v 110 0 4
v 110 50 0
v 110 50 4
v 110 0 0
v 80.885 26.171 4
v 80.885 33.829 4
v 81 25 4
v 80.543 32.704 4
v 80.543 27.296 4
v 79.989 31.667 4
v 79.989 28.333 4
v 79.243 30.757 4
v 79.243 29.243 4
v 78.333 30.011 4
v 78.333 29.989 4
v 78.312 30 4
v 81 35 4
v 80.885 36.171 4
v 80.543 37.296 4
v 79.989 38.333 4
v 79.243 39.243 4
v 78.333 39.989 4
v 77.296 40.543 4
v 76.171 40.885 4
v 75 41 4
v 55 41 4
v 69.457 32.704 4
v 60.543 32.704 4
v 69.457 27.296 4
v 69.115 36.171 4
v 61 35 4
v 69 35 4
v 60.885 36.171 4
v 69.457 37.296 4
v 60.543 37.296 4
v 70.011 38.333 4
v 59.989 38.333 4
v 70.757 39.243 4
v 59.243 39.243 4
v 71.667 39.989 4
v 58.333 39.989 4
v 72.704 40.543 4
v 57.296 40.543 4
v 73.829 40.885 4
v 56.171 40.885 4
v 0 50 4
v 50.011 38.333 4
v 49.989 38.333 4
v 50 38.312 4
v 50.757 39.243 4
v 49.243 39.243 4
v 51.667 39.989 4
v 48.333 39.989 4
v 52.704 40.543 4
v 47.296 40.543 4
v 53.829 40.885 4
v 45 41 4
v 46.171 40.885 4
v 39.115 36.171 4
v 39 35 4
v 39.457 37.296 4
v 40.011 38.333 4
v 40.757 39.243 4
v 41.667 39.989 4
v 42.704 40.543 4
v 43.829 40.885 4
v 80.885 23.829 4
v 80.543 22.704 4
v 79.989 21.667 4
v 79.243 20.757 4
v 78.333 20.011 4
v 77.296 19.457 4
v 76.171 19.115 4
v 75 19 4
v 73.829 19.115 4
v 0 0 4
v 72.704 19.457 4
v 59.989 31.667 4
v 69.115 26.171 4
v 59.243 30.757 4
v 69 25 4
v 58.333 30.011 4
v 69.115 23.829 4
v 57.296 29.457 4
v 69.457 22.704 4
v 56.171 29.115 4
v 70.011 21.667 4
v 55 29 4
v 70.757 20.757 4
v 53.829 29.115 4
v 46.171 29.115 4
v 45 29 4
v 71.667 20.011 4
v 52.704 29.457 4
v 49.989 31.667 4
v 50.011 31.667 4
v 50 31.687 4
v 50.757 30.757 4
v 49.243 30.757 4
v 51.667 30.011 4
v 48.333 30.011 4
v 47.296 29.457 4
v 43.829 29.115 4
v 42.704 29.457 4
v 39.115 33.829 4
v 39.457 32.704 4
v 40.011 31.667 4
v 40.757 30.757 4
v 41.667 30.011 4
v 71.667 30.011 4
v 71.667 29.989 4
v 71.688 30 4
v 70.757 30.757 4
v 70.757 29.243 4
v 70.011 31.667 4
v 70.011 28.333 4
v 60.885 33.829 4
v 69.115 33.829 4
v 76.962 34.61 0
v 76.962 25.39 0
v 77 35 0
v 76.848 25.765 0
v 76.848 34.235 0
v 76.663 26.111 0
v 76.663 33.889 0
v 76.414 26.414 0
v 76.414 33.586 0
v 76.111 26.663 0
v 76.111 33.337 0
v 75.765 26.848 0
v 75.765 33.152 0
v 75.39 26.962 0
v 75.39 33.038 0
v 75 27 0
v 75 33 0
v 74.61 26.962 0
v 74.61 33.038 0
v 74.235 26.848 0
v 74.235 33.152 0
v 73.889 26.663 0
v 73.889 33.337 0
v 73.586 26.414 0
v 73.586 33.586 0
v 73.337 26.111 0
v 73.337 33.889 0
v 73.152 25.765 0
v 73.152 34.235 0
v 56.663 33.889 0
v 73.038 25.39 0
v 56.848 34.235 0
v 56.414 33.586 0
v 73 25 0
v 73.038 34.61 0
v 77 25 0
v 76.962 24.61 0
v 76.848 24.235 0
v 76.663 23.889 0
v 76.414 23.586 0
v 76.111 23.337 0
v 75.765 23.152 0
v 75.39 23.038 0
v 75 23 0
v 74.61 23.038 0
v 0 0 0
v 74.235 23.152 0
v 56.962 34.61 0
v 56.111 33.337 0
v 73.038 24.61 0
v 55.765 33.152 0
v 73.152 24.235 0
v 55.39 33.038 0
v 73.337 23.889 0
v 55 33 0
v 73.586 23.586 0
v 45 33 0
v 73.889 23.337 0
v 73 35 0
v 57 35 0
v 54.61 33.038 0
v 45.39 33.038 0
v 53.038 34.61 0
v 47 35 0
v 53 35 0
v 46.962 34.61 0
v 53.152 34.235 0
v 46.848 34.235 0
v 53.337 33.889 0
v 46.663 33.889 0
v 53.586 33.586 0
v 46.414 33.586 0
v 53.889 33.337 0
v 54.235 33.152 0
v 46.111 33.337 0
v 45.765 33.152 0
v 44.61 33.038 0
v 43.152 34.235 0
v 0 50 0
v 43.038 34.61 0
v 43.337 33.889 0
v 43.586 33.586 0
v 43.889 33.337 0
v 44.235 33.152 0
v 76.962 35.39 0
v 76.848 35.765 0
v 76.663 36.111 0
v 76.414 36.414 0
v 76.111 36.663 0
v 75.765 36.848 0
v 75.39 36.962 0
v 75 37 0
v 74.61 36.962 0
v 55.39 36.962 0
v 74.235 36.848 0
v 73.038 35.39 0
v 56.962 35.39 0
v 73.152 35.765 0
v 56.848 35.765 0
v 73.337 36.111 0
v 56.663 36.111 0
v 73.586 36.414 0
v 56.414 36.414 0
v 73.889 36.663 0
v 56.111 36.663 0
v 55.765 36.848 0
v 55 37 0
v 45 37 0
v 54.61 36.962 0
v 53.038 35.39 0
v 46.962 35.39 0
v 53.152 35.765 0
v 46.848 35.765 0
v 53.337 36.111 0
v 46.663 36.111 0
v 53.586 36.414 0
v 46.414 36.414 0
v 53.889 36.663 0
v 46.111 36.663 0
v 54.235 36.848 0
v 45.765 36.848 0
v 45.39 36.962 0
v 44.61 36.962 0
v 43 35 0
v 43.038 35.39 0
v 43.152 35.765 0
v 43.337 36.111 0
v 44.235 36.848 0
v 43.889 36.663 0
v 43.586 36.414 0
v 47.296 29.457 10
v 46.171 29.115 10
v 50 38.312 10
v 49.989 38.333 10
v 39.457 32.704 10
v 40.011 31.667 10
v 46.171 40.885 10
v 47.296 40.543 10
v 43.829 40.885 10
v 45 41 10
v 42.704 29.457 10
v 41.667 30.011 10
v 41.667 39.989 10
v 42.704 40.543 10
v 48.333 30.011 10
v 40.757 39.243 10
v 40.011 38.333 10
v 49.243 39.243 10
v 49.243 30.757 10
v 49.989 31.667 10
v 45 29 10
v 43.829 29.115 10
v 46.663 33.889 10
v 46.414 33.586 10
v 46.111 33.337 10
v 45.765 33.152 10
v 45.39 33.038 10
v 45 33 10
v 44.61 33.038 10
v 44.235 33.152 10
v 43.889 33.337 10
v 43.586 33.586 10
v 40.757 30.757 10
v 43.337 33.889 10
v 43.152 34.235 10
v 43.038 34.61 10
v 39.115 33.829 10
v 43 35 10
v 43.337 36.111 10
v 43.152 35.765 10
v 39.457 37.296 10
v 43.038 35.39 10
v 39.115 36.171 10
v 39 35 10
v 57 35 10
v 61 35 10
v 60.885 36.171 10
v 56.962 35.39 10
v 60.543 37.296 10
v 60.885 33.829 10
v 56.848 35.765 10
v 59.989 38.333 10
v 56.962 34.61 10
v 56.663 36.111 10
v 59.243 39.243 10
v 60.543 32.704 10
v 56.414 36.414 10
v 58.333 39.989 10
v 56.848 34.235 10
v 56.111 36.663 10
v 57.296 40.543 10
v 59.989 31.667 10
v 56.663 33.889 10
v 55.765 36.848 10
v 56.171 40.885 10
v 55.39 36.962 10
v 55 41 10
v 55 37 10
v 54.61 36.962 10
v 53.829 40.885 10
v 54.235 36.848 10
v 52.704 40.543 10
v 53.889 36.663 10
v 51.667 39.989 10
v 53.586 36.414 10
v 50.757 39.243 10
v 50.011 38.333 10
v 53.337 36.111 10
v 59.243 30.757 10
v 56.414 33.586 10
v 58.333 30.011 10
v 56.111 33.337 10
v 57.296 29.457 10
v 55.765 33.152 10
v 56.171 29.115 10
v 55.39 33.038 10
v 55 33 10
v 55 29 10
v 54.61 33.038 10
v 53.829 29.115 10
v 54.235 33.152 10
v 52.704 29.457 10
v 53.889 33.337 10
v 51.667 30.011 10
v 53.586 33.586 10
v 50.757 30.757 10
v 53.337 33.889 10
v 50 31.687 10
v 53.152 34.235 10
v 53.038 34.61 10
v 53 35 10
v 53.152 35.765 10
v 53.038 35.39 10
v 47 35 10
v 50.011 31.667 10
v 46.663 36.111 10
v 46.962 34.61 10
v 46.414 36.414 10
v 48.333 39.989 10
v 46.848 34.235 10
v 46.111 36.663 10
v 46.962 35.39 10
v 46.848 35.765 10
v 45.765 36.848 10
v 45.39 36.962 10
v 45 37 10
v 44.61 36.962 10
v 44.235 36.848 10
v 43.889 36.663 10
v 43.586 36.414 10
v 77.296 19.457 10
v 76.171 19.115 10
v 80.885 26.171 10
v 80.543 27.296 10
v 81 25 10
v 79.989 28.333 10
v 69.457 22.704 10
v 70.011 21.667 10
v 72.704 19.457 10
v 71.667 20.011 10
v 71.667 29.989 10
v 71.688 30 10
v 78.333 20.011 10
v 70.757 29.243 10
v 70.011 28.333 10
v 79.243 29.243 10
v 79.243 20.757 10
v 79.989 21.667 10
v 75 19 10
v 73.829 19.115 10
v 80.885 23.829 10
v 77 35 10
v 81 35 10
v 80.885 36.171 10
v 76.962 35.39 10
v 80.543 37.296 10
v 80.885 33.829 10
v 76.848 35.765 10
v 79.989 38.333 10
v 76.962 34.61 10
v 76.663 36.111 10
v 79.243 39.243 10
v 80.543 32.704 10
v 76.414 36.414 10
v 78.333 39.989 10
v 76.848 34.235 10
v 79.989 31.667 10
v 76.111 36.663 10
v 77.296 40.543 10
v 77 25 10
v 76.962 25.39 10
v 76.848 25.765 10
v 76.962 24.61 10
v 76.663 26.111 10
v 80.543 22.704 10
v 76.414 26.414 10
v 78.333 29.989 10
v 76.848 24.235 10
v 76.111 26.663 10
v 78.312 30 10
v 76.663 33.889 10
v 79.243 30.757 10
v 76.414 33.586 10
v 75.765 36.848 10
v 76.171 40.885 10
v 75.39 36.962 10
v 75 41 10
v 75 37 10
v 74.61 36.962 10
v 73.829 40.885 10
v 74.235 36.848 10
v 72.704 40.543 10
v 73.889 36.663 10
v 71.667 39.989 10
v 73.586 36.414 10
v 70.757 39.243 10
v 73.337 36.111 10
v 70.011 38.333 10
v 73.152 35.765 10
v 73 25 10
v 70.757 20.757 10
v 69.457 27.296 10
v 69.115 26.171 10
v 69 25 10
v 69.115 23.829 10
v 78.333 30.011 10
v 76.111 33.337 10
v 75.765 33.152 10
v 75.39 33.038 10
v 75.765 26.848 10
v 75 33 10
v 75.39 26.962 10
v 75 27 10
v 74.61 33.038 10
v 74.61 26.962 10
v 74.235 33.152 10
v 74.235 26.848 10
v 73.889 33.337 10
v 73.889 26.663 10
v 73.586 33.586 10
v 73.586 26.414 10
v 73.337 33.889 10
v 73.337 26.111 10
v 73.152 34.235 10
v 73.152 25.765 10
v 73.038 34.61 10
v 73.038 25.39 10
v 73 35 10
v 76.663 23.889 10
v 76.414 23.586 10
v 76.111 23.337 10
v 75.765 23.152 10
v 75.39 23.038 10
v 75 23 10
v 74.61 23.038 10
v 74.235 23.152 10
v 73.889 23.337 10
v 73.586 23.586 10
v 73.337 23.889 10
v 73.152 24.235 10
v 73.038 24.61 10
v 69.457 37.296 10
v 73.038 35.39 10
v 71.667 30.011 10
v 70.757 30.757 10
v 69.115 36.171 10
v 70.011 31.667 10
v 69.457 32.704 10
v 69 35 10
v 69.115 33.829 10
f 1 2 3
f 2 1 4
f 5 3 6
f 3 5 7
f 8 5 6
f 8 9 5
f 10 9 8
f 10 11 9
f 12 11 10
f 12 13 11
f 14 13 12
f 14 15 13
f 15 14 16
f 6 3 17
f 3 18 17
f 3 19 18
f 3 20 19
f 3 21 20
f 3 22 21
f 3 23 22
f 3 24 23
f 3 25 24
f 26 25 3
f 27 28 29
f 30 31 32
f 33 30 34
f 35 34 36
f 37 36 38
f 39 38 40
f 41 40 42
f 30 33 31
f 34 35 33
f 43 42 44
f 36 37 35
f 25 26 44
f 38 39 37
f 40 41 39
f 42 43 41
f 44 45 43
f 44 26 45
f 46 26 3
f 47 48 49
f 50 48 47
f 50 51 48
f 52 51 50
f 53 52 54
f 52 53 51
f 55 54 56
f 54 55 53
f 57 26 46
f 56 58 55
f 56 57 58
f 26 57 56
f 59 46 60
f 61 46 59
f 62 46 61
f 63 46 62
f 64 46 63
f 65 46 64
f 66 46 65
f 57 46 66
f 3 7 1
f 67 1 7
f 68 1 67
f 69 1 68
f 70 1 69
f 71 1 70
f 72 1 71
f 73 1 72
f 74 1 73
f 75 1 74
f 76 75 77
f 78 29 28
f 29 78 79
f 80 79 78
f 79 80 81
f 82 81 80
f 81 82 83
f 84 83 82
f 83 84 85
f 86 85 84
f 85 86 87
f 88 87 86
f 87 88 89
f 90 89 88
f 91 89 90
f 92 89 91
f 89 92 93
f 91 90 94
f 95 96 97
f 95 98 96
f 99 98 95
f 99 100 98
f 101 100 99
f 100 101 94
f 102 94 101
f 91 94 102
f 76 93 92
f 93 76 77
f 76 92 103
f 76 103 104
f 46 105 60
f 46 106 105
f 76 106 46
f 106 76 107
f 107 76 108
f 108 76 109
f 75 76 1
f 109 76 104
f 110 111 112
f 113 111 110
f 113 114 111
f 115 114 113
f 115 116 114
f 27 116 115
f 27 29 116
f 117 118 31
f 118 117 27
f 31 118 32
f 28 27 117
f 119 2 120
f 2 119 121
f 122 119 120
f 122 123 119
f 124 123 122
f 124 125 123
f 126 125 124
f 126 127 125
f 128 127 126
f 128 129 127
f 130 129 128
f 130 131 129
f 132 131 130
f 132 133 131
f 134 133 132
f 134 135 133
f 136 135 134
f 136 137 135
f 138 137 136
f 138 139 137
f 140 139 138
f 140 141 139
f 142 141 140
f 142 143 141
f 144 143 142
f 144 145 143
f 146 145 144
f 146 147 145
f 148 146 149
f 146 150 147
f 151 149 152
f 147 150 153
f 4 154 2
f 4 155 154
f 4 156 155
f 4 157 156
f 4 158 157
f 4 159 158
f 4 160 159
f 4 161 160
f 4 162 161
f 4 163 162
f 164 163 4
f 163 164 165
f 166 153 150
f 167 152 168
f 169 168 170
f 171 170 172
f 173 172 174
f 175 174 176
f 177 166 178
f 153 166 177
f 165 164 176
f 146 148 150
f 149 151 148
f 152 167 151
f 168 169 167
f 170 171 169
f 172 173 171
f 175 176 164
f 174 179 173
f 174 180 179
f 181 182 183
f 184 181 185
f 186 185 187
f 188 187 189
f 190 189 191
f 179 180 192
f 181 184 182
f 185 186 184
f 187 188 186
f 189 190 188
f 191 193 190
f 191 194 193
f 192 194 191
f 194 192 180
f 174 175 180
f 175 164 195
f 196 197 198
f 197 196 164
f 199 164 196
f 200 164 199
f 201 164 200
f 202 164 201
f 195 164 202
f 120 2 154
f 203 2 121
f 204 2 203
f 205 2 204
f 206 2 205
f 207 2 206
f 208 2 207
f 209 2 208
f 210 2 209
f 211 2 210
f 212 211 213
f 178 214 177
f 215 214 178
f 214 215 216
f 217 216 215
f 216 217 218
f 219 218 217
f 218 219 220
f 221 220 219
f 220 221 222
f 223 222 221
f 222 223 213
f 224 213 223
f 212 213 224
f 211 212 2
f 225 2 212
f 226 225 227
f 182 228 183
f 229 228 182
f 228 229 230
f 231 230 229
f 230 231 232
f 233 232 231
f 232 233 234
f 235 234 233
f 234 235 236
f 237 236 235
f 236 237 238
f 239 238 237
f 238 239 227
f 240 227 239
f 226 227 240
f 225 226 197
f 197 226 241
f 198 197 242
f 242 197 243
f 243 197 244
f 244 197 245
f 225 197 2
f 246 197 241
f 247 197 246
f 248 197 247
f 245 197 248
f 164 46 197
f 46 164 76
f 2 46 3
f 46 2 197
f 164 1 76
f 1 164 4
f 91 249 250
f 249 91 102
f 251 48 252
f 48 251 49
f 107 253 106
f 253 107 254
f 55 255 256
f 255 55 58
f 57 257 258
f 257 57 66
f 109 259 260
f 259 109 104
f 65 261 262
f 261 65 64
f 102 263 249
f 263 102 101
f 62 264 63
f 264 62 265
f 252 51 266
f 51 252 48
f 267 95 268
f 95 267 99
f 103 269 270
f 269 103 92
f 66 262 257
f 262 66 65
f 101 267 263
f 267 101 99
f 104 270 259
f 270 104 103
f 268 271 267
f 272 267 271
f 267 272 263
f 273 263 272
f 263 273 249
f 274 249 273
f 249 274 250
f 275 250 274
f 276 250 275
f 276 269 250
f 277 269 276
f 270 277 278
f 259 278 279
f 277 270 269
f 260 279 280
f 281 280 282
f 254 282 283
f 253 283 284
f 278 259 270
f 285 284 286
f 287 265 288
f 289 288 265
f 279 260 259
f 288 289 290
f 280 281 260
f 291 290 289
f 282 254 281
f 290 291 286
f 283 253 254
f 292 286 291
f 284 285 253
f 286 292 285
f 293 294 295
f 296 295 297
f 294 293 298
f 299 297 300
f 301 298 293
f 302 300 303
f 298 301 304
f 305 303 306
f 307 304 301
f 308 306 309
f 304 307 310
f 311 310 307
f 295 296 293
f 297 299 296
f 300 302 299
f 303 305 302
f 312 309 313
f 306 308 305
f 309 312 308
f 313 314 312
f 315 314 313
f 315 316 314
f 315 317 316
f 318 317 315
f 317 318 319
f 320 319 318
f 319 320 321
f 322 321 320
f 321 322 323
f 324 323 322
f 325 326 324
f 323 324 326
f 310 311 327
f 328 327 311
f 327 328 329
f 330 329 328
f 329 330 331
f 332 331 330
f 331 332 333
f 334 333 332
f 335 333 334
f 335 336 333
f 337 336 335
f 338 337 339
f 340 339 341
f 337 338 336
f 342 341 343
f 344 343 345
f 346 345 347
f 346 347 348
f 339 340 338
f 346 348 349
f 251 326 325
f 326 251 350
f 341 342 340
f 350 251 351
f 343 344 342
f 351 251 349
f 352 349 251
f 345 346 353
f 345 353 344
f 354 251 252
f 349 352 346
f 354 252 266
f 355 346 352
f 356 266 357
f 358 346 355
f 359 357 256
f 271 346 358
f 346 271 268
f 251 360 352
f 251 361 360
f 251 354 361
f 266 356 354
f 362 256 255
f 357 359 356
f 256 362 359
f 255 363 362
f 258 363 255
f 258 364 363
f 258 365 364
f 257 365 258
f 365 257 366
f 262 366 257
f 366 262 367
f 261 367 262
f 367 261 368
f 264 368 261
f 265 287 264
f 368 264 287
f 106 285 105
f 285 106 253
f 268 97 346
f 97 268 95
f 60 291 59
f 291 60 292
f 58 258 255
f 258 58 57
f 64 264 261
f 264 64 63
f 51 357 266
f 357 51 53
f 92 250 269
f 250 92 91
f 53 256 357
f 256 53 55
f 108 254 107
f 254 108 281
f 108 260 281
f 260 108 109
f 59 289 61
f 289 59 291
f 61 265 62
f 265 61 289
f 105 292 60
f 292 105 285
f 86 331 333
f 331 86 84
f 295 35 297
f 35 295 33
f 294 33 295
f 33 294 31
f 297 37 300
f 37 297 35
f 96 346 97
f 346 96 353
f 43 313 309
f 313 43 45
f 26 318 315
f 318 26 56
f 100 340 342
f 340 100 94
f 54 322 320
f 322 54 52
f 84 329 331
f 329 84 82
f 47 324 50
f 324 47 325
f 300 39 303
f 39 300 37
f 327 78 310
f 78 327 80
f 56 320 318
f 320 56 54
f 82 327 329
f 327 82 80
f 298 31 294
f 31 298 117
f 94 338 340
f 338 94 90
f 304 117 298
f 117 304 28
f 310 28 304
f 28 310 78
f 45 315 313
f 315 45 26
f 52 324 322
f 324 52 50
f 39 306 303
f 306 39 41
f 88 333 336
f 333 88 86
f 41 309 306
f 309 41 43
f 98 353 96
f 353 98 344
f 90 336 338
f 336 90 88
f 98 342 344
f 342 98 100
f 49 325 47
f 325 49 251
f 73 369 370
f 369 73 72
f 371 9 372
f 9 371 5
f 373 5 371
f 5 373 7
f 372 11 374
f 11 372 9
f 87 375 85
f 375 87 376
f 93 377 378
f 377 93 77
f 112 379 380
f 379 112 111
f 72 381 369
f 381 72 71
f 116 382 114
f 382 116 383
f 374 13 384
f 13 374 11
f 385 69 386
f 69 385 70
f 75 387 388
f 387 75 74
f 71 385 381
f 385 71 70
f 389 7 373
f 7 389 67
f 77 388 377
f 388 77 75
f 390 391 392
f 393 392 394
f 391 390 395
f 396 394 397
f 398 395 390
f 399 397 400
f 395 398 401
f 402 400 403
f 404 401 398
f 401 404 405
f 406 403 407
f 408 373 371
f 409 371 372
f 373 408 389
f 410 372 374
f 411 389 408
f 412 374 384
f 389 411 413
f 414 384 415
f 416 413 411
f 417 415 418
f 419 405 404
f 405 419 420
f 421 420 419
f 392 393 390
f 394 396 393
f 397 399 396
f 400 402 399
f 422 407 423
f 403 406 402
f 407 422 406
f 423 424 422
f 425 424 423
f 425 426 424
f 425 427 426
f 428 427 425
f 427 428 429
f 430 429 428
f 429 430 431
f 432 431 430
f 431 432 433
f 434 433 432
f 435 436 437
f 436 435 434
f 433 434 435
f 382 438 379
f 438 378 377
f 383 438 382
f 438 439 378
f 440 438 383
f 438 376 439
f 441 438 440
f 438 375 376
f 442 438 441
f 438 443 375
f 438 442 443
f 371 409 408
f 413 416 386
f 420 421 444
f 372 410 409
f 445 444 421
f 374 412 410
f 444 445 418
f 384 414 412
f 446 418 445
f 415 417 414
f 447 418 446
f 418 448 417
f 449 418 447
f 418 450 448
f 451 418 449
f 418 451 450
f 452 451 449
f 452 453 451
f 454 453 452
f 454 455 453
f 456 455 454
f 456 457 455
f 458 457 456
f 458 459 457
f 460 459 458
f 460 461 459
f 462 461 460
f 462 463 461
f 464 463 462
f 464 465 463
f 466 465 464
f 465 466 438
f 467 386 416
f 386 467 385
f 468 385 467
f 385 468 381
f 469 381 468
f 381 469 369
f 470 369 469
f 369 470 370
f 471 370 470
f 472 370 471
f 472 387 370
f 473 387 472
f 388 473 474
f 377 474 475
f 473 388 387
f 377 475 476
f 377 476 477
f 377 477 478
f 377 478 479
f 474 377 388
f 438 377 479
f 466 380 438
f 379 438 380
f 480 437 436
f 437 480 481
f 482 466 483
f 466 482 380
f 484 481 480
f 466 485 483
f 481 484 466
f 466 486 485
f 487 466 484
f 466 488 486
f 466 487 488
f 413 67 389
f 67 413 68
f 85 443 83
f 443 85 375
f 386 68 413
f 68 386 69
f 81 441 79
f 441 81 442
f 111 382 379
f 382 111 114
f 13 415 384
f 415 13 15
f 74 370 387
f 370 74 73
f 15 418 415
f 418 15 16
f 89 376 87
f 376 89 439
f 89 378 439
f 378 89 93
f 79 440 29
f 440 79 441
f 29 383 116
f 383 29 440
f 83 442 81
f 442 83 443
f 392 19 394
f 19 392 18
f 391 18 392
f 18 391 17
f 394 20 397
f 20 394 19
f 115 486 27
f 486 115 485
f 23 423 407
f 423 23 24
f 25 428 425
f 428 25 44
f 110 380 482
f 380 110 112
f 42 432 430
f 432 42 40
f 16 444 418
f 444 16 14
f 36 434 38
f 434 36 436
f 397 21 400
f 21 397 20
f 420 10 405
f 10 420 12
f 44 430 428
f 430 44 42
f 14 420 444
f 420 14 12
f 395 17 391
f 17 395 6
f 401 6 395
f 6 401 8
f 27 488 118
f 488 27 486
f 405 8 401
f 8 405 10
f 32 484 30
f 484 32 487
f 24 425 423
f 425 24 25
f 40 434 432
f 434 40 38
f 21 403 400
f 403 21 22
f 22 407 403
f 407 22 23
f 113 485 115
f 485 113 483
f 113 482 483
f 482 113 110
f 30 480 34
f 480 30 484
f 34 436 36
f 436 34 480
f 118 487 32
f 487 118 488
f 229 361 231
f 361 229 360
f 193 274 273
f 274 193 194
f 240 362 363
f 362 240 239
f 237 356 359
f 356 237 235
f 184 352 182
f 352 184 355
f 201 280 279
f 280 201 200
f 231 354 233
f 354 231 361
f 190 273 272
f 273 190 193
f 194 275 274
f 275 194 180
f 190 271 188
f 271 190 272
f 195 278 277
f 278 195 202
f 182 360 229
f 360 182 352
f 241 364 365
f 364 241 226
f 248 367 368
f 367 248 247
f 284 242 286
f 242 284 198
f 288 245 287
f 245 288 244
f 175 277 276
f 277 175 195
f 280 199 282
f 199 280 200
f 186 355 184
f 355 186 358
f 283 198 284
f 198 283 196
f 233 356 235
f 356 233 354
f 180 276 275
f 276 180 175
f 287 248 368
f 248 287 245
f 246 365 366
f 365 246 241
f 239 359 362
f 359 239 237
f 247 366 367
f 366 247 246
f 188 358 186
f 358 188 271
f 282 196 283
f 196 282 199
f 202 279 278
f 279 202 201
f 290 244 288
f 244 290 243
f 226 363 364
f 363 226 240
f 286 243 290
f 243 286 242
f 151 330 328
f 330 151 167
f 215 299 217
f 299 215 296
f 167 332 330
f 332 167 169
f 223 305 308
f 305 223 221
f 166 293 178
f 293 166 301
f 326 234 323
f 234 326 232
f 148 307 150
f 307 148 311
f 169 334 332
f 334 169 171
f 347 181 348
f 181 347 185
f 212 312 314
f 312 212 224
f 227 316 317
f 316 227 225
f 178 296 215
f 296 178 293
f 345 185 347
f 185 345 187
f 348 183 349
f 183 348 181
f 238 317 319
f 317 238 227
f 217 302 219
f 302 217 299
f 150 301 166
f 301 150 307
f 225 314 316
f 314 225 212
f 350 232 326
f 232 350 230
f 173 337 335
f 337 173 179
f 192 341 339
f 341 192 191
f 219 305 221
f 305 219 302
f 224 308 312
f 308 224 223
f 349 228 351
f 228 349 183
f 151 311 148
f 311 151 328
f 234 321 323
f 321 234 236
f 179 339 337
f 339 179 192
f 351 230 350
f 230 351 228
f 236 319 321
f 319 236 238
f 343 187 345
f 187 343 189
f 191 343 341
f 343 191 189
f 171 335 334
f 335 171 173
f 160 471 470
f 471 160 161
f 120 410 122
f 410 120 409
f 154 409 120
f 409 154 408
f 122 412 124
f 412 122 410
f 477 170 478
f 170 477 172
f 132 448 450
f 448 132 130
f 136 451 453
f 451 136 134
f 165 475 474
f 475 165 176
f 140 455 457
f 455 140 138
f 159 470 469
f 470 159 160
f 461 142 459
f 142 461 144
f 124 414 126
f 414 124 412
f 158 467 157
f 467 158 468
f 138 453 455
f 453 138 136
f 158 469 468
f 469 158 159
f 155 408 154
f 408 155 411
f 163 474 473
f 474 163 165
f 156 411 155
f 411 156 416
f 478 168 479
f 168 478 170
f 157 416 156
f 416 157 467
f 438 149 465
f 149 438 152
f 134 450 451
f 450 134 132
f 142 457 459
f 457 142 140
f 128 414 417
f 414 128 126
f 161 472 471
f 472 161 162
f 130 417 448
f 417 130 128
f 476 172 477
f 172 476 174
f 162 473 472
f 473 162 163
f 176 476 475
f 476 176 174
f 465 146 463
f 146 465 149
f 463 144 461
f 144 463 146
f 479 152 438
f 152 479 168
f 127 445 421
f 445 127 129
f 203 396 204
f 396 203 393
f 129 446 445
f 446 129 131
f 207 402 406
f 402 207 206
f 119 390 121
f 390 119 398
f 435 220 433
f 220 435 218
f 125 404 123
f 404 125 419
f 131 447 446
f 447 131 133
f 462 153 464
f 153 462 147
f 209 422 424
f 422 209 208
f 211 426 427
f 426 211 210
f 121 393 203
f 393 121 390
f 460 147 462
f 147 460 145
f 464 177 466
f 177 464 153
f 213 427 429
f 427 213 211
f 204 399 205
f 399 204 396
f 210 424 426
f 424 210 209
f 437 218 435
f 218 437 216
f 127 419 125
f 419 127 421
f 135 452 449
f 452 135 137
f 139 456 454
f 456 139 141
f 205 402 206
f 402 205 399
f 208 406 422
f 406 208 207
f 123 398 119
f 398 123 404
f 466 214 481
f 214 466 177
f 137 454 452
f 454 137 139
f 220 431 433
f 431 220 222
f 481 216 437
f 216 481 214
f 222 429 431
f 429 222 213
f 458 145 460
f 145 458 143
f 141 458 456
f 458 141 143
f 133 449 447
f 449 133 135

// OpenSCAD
$fn = 32;

// ----------------------------------------------------------------------
// Boss field: plate with bosses at given coordinates
// ----------------------------------------------------------------------

// --- parameters (mm) ---
plate_l = 110;            // plate length, X
plate_w = 50;             // plate width, Y
plate_t = 4;              // plate thickness, Z
boss_d = 12;              // boss diameter
boss_h = 6;               // boss height above the plate
bore_d = 4;               // boss bore
fit_tol = 0.05;           // tolerance for press fits, mm
free_tol = 0.2;           // tolerance for clearance fits, mm

total_h = plate_t + boss_h;  // overall height

difference() {
  union() {
    cube([plate_l, plate_w, plate_t]);
    translate([45, 35, plate_t]) cylinder(h = boss_h, d = boss_d);
    translate([55, 35, plate_t]) cylinder(h = boss_h, d = boss_d);
    translate([75, 25, plate_t]) cylinder(h = boss_h, d = boss_d);
    translate([75, 35, plate_t]) cylinder(h = boss_h, d = boss_d);
  }
  translate([45, 35, -1]) cylinder(h = total_h + 2, d = bore_d);
  translate([55, 35, -1]) cylinder(h = total_h + 2, d = bore_d);
  translate([75, 25, -1]) cylinder(h = total_h + 2, d = bore_d);
  translate([75, 35, -1]) cylinder(h = total_h + 2, d = bore_d);
}
